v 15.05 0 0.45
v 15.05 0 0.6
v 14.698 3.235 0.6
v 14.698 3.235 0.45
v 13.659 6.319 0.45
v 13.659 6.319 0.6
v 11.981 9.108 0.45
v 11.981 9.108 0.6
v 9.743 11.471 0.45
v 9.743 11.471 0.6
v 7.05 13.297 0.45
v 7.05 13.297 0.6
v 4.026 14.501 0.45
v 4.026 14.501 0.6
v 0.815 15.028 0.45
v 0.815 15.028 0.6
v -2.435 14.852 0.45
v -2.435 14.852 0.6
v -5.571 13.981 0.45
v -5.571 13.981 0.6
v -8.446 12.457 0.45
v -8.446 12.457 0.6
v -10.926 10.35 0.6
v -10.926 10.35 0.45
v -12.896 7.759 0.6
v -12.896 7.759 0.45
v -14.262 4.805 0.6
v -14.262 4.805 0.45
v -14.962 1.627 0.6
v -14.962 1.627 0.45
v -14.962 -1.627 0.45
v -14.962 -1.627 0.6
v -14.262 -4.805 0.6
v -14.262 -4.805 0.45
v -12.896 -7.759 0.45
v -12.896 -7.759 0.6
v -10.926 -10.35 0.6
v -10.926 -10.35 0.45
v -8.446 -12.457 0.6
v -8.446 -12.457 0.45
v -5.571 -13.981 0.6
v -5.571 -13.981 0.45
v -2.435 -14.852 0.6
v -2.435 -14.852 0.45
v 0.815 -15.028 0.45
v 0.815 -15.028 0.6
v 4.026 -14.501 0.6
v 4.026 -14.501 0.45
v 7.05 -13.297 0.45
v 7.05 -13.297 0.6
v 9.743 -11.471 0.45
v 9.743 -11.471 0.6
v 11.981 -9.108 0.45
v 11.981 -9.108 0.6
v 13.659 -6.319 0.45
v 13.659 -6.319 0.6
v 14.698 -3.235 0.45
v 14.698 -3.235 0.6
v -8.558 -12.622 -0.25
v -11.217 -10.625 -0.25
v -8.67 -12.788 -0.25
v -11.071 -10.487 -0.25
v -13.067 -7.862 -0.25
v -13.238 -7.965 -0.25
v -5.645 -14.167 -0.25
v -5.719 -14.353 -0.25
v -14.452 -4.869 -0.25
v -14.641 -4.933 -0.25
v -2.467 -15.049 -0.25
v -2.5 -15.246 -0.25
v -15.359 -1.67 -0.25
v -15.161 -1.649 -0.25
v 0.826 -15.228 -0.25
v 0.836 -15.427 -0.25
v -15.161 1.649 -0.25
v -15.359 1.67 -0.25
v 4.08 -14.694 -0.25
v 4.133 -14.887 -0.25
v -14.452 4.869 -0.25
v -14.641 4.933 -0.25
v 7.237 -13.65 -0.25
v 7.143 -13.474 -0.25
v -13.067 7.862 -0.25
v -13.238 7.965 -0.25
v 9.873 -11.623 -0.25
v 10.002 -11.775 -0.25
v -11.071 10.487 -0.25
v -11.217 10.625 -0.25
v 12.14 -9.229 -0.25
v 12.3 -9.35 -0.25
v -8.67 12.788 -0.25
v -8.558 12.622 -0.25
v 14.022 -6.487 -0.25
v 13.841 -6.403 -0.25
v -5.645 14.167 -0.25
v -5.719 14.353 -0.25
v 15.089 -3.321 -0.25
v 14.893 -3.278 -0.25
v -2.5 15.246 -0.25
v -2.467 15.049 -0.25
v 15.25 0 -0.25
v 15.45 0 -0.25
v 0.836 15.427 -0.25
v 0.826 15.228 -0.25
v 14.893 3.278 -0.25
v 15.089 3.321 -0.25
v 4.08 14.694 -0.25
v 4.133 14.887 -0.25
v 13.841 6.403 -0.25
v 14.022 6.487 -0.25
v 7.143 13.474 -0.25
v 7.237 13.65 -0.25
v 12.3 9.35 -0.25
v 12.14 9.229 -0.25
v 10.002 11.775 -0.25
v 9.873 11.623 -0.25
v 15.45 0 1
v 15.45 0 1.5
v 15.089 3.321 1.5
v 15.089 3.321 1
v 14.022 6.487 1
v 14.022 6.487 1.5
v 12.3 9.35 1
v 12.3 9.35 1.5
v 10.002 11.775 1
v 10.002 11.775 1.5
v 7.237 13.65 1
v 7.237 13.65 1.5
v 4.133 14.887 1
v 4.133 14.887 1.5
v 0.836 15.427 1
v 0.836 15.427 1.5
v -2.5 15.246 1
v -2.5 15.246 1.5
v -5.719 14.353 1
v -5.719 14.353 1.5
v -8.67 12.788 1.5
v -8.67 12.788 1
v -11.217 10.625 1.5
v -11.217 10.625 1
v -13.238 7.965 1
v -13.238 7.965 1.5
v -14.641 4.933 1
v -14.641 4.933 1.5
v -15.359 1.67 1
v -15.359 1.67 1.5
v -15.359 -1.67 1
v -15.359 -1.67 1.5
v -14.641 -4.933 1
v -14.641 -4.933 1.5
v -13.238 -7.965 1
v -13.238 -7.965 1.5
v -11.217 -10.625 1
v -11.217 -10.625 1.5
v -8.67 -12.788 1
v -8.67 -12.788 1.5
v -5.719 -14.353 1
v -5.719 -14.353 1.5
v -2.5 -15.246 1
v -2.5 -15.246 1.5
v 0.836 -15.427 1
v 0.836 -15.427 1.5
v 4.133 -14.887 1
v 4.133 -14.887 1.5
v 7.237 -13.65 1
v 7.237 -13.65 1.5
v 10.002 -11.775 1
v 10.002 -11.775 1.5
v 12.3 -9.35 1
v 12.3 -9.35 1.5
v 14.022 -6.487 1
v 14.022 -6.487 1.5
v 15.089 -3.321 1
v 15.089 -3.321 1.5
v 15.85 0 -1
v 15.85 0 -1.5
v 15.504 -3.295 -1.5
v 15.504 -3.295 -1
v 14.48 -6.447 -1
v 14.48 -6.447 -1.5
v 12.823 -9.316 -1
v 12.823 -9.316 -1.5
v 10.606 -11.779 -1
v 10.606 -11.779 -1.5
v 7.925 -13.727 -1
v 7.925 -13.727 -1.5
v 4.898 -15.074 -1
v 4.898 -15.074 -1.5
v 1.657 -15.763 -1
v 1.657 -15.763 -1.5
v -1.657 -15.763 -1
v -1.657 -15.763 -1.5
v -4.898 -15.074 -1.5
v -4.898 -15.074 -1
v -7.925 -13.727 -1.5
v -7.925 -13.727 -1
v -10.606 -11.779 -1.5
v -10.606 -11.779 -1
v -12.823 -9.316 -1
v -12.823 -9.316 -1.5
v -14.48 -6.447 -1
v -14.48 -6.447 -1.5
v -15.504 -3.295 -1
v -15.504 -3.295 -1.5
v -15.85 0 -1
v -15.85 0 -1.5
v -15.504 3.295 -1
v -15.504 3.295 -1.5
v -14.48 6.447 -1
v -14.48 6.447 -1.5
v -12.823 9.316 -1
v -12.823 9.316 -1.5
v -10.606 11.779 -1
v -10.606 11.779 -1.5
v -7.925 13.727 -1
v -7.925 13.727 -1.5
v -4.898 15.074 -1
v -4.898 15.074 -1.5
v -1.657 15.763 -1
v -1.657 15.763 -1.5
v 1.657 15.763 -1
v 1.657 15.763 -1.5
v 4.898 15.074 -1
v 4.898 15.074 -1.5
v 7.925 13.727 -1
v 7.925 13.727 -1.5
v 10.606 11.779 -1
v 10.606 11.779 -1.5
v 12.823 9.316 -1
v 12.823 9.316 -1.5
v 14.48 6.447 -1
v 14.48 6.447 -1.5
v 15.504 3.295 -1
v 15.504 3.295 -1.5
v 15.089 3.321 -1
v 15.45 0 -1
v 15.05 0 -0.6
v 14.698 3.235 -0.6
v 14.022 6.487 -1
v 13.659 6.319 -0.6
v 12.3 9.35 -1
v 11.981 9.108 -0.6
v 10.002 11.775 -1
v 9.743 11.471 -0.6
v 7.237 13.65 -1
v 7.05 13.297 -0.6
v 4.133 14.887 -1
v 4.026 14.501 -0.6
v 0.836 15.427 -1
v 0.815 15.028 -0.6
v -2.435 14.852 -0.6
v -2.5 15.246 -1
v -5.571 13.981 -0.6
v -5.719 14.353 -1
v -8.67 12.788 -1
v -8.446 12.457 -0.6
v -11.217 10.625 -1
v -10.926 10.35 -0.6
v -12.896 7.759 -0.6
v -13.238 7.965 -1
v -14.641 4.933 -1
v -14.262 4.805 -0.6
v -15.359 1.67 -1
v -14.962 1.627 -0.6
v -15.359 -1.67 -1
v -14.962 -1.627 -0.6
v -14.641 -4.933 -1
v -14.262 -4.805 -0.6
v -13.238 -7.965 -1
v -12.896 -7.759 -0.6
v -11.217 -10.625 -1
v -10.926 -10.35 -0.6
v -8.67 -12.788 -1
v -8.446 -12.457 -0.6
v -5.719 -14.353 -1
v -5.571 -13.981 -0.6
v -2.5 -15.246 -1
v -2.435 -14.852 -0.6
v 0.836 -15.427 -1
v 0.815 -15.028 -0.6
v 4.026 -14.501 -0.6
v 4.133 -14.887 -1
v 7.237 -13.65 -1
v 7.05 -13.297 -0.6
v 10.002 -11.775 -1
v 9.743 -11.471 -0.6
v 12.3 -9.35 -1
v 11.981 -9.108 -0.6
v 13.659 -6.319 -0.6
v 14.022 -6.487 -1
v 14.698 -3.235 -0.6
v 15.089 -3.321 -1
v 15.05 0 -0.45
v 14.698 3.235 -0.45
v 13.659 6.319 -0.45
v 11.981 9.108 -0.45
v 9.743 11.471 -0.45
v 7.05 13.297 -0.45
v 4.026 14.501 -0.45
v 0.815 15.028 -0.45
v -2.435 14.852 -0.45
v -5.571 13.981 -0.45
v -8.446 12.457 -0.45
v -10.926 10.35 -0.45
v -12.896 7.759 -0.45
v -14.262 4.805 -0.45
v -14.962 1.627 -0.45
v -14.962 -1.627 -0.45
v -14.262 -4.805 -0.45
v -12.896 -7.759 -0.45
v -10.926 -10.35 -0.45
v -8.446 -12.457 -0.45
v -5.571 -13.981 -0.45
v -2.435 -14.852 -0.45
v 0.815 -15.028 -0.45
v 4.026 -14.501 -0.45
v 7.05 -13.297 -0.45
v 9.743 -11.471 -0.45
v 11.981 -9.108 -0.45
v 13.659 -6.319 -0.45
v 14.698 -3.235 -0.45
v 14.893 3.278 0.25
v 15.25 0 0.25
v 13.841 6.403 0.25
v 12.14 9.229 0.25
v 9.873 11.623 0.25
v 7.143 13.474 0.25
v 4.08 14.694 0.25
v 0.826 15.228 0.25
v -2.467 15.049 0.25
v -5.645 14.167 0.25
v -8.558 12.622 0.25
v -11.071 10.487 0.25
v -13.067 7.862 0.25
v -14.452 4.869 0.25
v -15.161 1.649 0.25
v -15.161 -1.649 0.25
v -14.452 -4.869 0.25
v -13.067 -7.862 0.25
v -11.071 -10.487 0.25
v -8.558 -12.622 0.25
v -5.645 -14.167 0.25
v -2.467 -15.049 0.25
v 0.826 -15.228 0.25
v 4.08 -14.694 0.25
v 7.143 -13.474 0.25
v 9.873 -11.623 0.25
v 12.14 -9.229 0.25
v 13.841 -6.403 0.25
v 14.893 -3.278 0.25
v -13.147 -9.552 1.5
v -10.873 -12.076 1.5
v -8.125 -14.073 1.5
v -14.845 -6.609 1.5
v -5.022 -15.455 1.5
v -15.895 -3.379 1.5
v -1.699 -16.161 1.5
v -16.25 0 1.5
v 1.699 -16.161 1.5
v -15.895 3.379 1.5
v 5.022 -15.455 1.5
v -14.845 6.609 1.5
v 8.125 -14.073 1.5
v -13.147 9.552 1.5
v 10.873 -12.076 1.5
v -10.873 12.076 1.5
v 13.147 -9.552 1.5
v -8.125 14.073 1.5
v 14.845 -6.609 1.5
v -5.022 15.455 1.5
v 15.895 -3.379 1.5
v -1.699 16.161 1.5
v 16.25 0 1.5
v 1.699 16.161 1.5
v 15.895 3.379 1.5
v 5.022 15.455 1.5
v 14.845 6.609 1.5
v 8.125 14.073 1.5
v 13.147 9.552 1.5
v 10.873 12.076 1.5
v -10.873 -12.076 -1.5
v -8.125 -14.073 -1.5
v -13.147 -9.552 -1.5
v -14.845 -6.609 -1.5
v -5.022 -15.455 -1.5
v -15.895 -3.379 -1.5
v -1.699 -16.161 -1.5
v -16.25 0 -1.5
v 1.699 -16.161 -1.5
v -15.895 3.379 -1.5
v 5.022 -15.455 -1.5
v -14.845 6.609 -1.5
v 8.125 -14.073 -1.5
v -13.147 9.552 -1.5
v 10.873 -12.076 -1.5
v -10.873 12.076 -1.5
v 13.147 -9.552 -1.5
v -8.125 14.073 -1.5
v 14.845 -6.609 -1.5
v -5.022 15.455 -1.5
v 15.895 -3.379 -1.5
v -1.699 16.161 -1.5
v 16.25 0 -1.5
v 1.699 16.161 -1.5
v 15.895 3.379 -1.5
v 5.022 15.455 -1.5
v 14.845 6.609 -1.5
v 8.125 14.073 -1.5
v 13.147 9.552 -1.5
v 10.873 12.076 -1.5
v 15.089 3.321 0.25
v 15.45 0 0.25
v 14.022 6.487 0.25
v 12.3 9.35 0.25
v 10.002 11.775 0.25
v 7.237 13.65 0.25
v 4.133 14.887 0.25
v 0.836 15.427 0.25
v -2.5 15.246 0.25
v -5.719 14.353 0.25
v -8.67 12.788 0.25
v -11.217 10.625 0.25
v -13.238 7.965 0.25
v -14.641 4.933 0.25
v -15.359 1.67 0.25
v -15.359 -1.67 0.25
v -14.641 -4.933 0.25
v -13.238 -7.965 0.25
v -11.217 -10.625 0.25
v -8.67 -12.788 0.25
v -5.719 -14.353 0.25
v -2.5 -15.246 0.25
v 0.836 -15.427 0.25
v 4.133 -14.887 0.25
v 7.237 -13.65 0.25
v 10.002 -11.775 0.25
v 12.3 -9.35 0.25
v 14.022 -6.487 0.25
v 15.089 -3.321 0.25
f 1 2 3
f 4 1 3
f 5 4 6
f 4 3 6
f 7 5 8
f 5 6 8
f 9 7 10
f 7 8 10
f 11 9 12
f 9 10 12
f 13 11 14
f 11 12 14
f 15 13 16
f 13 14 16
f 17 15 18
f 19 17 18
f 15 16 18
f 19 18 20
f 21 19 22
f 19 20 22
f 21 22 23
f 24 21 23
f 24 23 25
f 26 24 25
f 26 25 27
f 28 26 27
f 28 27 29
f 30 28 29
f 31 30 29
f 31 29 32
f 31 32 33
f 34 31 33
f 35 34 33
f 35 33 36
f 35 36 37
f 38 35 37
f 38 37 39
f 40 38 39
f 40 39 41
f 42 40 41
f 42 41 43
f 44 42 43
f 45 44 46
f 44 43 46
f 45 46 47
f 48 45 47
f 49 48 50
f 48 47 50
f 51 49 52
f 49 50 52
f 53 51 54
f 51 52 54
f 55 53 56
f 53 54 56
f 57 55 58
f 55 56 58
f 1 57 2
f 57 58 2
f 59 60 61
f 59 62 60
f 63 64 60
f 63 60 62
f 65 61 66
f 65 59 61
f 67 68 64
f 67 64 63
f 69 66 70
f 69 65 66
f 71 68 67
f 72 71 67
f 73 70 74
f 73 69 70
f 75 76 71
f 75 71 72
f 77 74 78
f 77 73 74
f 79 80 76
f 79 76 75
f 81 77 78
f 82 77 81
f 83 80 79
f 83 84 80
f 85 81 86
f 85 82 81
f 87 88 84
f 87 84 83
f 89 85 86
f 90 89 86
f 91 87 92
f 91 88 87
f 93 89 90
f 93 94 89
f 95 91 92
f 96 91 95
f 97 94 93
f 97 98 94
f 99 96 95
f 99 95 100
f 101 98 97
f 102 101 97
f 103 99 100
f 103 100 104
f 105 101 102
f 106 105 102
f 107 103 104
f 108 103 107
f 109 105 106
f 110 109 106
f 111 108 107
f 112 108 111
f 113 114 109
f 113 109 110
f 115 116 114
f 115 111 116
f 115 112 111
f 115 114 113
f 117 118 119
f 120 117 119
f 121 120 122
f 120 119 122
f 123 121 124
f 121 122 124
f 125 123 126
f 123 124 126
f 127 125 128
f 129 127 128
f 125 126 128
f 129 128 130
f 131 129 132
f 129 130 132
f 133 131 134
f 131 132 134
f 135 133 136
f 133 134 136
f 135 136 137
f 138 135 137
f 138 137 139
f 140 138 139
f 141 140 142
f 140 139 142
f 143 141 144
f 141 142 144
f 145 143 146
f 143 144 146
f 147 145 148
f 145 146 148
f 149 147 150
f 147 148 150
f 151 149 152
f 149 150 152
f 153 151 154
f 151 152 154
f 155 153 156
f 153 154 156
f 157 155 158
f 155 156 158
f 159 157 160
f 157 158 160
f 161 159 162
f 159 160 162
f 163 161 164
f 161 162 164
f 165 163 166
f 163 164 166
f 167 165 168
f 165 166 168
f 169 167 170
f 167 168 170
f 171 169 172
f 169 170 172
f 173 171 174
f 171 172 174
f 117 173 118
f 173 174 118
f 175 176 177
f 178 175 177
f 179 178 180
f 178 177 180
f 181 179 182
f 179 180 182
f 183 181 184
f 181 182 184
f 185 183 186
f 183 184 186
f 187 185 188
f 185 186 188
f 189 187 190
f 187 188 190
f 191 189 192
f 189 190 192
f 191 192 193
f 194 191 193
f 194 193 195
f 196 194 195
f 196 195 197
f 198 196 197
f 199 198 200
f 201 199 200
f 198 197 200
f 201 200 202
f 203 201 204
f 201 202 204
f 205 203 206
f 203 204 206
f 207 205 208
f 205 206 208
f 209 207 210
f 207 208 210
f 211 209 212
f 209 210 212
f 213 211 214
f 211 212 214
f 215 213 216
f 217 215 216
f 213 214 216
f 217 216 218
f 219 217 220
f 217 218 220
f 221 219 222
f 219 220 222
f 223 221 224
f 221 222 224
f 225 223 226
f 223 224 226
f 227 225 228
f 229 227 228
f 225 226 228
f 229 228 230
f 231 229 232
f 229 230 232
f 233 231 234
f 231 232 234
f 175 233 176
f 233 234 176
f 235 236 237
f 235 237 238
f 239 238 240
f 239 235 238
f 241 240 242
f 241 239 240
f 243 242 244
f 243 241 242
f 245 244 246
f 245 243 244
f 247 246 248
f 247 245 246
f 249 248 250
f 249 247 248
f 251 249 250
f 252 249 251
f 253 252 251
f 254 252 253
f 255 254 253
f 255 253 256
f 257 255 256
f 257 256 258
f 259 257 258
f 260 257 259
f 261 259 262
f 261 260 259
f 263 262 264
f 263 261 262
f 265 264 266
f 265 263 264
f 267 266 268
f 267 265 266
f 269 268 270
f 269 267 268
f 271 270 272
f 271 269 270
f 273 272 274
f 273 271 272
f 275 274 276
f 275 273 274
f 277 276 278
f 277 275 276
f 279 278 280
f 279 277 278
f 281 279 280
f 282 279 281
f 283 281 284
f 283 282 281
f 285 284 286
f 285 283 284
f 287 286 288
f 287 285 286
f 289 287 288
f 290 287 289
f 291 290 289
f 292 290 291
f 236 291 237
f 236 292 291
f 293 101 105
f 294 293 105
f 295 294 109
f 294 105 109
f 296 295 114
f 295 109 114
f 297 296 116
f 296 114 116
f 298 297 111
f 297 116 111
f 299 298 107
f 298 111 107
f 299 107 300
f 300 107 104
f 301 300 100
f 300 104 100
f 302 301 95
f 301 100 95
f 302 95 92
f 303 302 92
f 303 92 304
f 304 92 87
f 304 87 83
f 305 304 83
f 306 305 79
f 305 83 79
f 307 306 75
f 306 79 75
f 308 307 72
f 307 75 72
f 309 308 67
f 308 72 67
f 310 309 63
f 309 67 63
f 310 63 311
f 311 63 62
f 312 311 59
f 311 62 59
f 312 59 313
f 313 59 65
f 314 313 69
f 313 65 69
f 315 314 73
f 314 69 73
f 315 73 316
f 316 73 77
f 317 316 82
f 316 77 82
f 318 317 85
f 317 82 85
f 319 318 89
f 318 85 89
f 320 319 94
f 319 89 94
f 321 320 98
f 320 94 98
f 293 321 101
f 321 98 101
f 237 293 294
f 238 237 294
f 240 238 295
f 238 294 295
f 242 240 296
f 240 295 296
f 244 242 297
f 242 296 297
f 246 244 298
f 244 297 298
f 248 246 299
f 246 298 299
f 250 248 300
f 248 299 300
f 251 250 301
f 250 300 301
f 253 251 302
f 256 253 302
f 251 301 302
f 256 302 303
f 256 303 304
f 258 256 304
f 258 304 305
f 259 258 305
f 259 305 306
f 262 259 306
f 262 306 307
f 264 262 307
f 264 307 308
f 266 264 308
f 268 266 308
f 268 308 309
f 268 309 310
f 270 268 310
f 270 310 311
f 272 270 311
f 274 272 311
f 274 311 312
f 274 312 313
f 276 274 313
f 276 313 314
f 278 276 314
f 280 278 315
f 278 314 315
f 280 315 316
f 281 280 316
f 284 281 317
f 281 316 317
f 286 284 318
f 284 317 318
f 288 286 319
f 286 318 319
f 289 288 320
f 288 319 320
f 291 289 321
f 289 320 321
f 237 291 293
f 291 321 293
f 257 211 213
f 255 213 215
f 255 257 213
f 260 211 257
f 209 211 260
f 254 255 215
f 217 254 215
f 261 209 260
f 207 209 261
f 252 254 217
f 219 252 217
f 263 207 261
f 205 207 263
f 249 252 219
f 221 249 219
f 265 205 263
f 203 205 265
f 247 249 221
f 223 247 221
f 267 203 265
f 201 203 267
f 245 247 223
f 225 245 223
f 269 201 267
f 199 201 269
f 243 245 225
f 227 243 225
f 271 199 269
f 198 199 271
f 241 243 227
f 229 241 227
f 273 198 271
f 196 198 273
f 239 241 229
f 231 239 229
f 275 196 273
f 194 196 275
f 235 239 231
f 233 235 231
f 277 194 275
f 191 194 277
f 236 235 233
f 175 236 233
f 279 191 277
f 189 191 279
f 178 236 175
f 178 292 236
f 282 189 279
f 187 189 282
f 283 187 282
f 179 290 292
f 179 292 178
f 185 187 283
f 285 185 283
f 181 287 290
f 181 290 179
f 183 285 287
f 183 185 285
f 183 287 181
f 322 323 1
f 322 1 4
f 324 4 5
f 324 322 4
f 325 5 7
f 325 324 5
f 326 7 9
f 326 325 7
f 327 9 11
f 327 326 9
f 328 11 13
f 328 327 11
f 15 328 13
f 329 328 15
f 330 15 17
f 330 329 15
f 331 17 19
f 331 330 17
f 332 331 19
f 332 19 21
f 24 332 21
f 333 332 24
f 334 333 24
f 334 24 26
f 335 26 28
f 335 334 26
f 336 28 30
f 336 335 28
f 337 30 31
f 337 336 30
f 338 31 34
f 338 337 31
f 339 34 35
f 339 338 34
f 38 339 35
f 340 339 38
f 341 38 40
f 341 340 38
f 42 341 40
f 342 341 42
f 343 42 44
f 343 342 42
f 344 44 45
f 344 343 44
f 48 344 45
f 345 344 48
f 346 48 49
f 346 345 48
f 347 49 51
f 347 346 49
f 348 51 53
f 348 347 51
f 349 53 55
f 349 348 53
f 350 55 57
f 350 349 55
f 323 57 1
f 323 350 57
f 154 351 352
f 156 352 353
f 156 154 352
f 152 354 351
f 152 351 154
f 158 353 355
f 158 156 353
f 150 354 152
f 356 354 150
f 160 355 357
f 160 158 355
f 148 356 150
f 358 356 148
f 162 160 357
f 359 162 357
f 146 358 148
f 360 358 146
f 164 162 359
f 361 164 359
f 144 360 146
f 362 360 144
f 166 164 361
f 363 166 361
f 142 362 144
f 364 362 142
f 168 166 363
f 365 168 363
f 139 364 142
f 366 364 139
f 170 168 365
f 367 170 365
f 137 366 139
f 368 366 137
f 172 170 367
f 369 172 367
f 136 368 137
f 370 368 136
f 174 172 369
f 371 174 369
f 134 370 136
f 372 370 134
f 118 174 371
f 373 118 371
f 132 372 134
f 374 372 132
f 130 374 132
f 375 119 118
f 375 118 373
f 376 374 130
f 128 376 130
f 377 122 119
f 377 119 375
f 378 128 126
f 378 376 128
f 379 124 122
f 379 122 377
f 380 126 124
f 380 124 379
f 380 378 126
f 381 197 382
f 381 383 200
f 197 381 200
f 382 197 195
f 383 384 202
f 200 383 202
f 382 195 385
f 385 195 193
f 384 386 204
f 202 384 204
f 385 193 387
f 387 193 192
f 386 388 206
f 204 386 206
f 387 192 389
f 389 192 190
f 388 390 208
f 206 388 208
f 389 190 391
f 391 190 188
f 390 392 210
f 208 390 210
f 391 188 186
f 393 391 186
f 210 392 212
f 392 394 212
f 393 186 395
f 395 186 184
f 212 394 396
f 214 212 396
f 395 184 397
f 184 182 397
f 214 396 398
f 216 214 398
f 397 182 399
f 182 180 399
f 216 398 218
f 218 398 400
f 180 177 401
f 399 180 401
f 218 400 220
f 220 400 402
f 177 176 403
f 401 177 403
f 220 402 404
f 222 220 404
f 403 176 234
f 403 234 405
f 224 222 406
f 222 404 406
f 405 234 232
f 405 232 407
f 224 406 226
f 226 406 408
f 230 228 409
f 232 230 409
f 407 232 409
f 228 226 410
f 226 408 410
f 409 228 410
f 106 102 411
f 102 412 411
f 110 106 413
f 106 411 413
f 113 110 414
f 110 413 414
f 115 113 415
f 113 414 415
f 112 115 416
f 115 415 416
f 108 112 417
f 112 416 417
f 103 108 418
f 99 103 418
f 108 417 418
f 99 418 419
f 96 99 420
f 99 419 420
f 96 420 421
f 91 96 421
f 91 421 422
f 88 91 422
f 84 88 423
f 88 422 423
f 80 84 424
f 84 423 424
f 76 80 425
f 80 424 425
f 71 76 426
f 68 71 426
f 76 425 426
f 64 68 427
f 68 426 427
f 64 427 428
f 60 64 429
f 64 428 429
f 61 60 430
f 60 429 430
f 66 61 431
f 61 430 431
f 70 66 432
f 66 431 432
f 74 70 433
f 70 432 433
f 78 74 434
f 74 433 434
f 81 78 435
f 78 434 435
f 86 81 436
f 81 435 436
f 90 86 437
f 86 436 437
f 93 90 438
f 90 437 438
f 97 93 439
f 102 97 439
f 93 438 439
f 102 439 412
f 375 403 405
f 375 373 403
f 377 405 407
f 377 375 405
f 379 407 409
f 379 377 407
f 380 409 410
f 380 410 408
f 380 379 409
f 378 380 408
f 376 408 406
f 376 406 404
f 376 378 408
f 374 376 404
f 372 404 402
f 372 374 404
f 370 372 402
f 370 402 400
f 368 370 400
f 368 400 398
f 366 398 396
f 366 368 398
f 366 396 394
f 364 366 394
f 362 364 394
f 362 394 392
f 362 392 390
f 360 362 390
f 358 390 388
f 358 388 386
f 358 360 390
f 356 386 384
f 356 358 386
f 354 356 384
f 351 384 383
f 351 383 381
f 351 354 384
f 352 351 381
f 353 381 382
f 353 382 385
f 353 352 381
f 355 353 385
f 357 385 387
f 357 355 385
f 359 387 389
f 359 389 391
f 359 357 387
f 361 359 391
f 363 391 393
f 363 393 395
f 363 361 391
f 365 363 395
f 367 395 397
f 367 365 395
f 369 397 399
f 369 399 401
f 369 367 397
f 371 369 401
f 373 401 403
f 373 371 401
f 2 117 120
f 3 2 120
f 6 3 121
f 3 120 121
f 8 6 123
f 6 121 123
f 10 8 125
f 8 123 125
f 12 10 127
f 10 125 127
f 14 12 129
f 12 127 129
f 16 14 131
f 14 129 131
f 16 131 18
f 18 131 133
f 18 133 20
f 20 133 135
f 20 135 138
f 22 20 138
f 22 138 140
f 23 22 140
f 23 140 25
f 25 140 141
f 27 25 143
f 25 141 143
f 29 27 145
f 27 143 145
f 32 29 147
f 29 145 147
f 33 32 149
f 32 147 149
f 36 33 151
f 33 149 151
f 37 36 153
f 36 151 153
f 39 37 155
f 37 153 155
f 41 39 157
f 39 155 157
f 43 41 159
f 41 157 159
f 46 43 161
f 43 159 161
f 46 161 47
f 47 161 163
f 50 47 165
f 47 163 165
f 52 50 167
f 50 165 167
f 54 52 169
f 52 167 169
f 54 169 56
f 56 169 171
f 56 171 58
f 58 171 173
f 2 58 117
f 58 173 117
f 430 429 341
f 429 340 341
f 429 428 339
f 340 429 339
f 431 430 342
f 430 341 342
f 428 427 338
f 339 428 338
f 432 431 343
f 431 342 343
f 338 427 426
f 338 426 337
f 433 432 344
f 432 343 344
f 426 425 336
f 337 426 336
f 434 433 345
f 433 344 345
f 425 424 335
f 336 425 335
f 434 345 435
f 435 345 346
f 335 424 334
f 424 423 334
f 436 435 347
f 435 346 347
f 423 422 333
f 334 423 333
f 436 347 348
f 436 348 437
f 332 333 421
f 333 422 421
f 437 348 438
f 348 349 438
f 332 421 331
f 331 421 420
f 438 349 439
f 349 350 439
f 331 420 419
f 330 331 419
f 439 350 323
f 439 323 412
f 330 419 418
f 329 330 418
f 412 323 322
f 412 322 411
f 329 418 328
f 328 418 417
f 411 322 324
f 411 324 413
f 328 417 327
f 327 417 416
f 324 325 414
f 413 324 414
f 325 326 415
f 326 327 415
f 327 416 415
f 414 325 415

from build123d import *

# Parameters (mm, degrees)
F0_R      = 16.25
F1_DEPTH  = 1.5
F2_R      = 15.05
F3_DEPTH  = 3.001
F4_R      = 15.45
F5_DEPTH  = 0.25
F6_SIZE   = 0.2
F7_R      = 15.45
F8_DEPTH  = 0.5
F9_R      = 15.85
F10_DEPTH = 0.5
F11_SIZE  = 0.39999


# Not quite as in the source:
# - a fillet or chamfer is up to 0.001 mm smaller than in the source, because OpenCascade refuses the exact size


with BuildPart() as f1:
    # F0 (on Top) → F1 (new body, symmetric)
    with BuildSketch(Plane.XY):
        Circle(F0_R)
    extrude(amount=F1_DEPTH, both=True)

    # F2 (on face) → F3 (cut, through all)
    with BuildSketch(Plane.XY.offset(1.5)):
        Circle(F2_R)
    extrude(amount=-F3_DEPTH, mode=Mode.SUBTRACT)

    # F4 (on Top) → F5 (cut, symmetric)
    with BuildSketch(Plane.XY):
        Circle(F4_R)
    extrude(amount=F5_DEPTH, both=True, mode=Mode.SUBTRACT)

    # F6
    f6_edges = [f1.edges().sort_by_distance(p)[0] for p in [
        (-15.05, 0, 0.25),
        (-15.05, 0, -0.25),
    ]]
    chamfer(f6_edges, length=F6_SIZE)

    # F7 (on face) → F8 (cut)
    with BuildSketch(Plane.XY.offset(1.5)):
        Circle(F7_R)
    extrude(amount=-F8_DEPTH, mode=Mode.SUBTRACT)

    # F9 (on face) → F10 (cut)
    with BuildSketch(Plane(origin=(0, 0, -1.5), x_dir=(1, 0, 0), z_dir=(0, 0, -1))):
        Circle(F9_R)
    extrude(amount=-F10_DEPTH, mode=Mode.SUBTRACT)

    # F11 (size 0.4 in the source; OpenCascade refuses exactly that, so slightly less here)
    f11_edges = [f1.edges().sort_by_distance(p)[0] for p in [
        (-15.05, 0, 1),
        (-15.05, 0, -1),
    ]]
    chamfer(f11_edges, length=F11_SIZE)


solid = f1.part
